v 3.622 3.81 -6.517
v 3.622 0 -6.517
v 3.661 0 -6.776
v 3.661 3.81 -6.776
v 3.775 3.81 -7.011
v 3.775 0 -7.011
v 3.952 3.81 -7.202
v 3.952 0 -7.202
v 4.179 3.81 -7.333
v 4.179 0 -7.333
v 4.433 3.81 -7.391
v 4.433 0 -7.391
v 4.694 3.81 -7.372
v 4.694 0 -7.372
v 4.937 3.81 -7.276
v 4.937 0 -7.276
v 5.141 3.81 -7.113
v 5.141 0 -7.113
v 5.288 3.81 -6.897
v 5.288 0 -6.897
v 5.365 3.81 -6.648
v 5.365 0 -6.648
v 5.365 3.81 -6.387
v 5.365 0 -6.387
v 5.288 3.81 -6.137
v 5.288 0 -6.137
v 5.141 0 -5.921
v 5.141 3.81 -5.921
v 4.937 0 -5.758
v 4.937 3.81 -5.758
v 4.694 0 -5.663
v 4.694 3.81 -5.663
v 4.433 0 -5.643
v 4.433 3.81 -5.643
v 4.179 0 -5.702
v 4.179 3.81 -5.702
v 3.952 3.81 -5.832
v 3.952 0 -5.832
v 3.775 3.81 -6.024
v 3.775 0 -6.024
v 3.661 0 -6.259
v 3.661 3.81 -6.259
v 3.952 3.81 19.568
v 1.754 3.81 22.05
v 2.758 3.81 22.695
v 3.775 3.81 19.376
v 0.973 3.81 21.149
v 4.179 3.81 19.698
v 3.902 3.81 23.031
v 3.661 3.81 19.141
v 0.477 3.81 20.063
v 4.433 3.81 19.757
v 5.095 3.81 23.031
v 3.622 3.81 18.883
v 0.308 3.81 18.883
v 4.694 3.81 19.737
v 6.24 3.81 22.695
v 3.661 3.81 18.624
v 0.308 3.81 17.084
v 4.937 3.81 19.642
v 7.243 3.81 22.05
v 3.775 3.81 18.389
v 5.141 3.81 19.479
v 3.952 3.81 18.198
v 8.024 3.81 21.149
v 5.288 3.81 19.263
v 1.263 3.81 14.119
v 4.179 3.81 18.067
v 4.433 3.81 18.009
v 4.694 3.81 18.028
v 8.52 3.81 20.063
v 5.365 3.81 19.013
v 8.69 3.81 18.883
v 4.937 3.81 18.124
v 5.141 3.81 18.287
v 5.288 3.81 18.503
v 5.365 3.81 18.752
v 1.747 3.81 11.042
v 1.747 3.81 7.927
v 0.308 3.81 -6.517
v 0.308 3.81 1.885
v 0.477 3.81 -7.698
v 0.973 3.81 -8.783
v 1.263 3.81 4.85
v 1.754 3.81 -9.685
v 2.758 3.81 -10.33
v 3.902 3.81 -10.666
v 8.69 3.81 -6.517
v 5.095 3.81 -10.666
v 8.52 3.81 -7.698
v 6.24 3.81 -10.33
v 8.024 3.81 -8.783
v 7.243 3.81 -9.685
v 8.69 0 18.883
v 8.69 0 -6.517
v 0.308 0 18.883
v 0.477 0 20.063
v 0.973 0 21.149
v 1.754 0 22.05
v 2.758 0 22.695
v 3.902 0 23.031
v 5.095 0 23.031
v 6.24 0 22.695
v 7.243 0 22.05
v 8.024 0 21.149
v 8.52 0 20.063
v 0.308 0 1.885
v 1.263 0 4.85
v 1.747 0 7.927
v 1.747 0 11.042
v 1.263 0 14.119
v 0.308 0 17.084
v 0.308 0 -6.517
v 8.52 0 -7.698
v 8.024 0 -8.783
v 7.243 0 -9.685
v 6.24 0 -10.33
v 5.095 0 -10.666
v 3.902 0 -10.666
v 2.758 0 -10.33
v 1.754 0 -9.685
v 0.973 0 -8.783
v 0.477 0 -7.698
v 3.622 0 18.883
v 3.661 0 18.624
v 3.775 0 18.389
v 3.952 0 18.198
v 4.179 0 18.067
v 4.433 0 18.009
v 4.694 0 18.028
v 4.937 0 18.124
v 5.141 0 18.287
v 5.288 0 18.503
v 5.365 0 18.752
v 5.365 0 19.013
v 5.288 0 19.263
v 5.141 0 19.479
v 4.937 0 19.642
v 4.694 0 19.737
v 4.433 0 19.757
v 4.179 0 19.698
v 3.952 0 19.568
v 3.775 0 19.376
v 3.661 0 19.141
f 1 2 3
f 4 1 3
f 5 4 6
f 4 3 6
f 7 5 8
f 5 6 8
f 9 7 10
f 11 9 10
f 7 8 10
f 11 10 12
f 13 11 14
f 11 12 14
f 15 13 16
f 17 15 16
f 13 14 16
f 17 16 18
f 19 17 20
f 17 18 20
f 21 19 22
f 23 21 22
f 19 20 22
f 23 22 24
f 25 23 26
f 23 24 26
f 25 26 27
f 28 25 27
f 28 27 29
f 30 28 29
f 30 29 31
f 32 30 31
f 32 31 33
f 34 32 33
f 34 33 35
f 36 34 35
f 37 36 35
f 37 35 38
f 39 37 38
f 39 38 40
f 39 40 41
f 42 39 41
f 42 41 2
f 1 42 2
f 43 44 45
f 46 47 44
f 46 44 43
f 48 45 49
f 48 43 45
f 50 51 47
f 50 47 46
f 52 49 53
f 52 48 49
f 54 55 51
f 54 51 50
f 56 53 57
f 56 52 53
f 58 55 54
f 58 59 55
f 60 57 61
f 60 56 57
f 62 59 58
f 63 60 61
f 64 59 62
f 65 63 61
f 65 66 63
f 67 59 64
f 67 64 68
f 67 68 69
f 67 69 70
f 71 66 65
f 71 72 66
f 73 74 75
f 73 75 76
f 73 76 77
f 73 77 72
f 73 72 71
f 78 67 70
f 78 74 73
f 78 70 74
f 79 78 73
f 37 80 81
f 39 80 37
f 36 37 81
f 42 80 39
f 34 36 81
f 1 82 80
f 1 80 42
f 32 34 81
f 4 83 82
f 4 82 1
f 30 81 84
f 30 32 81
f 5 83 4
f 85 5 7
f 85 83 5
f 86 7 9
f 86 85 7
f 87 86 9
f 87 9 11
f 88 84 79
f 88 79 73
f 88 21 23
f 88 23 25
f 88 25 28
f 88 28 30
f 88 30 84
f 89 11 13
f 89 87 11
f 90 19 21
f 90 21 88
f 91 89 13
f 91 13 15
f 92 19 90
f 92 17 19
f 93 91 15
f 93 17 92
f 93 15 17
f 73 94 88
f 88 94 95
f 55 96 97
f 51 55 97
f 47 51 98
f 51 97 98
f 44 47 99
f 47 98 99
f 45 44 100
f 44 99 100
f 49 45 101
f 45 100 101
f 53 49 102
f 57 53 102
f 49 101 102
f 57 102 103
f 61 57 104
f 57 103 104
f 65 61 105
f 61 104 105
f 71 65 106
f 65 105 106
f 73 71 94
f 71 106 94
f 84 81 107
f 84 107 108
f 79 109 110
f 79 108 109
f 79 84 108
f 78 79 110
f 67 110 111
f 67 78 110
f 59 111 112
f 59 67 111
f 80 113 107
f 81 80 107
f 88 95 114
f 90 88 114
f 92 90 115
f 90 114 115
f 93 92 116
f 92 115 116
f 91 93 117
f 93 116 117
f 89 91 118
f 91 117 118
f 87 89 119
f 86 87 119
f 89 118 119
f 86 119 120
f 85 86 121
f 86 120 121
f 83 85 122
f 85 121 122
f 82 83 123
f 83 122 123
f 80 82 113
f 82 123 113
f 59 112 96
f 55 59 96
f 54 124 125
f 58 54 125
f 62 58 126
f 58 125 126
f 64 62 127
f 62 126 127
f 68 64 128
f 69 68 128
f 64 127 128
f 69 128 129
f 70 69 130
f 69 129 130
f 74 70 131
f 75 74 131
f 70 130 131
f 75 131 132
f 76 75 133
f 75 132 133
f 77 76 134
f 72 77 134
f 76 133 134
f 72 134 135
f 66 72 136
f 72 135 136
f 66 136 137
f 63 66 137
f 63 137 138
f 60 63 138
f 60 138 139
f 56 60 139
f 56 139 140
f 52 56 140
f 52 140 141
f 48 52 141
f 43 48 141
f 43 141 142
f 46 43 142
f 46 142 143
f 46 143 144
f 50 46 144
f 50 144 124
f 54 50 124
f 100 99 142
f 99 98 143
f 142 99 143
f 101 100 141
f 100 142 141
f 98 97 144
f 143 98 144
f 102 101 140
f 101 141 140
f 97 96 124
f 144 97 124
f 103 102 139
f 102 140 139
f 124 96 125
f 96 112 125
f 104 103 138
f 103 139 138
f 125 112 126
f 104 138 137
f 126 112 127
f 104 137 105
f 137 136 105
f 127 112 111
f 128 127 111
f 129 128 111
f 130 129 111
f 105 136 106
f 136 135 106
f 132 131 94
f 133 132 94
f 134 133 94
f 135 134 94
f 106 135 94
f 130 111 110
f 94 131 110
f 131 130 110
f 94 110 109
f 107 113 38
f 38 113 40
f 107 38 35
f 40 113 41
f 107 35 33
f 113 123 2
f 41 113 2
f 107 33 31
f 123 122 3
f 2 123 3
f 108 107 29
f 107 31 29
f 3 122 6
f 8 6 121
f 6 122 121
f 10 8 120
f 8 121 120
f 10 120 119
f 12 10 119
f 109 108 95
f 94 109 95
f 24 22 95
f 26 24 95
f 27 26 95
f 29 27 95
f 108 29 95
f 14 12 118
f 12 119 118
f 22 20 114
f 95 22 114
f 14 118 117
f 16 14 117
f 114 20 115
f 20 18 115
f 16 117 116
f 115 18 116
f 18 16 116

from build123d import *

# Parameters (mm, degrees)
BOSS_EXTRUDE1_DEPTH   = 3.81
F_4_40_TAPPED_HOLE1_D = 1.7526
CUT_EXTRUDE1_DEPTH    = 25.948437705


with BuildPart() as part:
    # Sketch1 → Boss-Extrude1 (new body)
    with BuildSketch(Plane(origin=(0, 0, 0), x_dir=(1, 0, 0), z_dir=(0, 1, 0))):
        with BuildLine():
            Line((0.307655172, 6.517241379), (0.307655172, -18.882758621))
            ThreePointArc((0.307655172, -18.882758621), (4.498655172, -23.073758621), (8.689655172, -18.882758621))
            Line((8.689655172, -18.882758621), (8.689655172, 6.517241379))
            ThreePointArc((8.689655172, 6.517241379), (4.498655172, 10.708241379), (0.307655172, 6.517241379))
        make_face()
    extrude(amount=BOSS_EXTRUDE1_DEPTH)

    # #4-40 Tapped Hole1 (through all)
    with Locations(Plane(origin=(0, 3.81, 0), x_dir=(1, 0, 0), z_dir=(0, 1, 0))):
        with Locations((4.498655172, 6.517241379), (4.498655172, -18.882758621)):
            Hole(F_4_40_TAPPED_HOLE1_D / 2)

    # Sketch4 → Cut-Extrude1 (cut, through all)
    with BuildSketch(Plane(origin=(0, 3.81, 0), x_dir=(1, 0, 0), z_dir=(0, 1, 0))):
        with BuildLine():
            Line((0.307655172, -17.084100697), (0.307655172, -1.885416544))
            ThreePointArc((0.307655172, -1.885416544), (1.807655172, -9.484758621), (0.307655172, -17.084100697))
        make_face()
    extrude(amount=-CUT_EXTRUDE1_DEPTH, mode=Mode.SUBTRACT)


solid = part.part
